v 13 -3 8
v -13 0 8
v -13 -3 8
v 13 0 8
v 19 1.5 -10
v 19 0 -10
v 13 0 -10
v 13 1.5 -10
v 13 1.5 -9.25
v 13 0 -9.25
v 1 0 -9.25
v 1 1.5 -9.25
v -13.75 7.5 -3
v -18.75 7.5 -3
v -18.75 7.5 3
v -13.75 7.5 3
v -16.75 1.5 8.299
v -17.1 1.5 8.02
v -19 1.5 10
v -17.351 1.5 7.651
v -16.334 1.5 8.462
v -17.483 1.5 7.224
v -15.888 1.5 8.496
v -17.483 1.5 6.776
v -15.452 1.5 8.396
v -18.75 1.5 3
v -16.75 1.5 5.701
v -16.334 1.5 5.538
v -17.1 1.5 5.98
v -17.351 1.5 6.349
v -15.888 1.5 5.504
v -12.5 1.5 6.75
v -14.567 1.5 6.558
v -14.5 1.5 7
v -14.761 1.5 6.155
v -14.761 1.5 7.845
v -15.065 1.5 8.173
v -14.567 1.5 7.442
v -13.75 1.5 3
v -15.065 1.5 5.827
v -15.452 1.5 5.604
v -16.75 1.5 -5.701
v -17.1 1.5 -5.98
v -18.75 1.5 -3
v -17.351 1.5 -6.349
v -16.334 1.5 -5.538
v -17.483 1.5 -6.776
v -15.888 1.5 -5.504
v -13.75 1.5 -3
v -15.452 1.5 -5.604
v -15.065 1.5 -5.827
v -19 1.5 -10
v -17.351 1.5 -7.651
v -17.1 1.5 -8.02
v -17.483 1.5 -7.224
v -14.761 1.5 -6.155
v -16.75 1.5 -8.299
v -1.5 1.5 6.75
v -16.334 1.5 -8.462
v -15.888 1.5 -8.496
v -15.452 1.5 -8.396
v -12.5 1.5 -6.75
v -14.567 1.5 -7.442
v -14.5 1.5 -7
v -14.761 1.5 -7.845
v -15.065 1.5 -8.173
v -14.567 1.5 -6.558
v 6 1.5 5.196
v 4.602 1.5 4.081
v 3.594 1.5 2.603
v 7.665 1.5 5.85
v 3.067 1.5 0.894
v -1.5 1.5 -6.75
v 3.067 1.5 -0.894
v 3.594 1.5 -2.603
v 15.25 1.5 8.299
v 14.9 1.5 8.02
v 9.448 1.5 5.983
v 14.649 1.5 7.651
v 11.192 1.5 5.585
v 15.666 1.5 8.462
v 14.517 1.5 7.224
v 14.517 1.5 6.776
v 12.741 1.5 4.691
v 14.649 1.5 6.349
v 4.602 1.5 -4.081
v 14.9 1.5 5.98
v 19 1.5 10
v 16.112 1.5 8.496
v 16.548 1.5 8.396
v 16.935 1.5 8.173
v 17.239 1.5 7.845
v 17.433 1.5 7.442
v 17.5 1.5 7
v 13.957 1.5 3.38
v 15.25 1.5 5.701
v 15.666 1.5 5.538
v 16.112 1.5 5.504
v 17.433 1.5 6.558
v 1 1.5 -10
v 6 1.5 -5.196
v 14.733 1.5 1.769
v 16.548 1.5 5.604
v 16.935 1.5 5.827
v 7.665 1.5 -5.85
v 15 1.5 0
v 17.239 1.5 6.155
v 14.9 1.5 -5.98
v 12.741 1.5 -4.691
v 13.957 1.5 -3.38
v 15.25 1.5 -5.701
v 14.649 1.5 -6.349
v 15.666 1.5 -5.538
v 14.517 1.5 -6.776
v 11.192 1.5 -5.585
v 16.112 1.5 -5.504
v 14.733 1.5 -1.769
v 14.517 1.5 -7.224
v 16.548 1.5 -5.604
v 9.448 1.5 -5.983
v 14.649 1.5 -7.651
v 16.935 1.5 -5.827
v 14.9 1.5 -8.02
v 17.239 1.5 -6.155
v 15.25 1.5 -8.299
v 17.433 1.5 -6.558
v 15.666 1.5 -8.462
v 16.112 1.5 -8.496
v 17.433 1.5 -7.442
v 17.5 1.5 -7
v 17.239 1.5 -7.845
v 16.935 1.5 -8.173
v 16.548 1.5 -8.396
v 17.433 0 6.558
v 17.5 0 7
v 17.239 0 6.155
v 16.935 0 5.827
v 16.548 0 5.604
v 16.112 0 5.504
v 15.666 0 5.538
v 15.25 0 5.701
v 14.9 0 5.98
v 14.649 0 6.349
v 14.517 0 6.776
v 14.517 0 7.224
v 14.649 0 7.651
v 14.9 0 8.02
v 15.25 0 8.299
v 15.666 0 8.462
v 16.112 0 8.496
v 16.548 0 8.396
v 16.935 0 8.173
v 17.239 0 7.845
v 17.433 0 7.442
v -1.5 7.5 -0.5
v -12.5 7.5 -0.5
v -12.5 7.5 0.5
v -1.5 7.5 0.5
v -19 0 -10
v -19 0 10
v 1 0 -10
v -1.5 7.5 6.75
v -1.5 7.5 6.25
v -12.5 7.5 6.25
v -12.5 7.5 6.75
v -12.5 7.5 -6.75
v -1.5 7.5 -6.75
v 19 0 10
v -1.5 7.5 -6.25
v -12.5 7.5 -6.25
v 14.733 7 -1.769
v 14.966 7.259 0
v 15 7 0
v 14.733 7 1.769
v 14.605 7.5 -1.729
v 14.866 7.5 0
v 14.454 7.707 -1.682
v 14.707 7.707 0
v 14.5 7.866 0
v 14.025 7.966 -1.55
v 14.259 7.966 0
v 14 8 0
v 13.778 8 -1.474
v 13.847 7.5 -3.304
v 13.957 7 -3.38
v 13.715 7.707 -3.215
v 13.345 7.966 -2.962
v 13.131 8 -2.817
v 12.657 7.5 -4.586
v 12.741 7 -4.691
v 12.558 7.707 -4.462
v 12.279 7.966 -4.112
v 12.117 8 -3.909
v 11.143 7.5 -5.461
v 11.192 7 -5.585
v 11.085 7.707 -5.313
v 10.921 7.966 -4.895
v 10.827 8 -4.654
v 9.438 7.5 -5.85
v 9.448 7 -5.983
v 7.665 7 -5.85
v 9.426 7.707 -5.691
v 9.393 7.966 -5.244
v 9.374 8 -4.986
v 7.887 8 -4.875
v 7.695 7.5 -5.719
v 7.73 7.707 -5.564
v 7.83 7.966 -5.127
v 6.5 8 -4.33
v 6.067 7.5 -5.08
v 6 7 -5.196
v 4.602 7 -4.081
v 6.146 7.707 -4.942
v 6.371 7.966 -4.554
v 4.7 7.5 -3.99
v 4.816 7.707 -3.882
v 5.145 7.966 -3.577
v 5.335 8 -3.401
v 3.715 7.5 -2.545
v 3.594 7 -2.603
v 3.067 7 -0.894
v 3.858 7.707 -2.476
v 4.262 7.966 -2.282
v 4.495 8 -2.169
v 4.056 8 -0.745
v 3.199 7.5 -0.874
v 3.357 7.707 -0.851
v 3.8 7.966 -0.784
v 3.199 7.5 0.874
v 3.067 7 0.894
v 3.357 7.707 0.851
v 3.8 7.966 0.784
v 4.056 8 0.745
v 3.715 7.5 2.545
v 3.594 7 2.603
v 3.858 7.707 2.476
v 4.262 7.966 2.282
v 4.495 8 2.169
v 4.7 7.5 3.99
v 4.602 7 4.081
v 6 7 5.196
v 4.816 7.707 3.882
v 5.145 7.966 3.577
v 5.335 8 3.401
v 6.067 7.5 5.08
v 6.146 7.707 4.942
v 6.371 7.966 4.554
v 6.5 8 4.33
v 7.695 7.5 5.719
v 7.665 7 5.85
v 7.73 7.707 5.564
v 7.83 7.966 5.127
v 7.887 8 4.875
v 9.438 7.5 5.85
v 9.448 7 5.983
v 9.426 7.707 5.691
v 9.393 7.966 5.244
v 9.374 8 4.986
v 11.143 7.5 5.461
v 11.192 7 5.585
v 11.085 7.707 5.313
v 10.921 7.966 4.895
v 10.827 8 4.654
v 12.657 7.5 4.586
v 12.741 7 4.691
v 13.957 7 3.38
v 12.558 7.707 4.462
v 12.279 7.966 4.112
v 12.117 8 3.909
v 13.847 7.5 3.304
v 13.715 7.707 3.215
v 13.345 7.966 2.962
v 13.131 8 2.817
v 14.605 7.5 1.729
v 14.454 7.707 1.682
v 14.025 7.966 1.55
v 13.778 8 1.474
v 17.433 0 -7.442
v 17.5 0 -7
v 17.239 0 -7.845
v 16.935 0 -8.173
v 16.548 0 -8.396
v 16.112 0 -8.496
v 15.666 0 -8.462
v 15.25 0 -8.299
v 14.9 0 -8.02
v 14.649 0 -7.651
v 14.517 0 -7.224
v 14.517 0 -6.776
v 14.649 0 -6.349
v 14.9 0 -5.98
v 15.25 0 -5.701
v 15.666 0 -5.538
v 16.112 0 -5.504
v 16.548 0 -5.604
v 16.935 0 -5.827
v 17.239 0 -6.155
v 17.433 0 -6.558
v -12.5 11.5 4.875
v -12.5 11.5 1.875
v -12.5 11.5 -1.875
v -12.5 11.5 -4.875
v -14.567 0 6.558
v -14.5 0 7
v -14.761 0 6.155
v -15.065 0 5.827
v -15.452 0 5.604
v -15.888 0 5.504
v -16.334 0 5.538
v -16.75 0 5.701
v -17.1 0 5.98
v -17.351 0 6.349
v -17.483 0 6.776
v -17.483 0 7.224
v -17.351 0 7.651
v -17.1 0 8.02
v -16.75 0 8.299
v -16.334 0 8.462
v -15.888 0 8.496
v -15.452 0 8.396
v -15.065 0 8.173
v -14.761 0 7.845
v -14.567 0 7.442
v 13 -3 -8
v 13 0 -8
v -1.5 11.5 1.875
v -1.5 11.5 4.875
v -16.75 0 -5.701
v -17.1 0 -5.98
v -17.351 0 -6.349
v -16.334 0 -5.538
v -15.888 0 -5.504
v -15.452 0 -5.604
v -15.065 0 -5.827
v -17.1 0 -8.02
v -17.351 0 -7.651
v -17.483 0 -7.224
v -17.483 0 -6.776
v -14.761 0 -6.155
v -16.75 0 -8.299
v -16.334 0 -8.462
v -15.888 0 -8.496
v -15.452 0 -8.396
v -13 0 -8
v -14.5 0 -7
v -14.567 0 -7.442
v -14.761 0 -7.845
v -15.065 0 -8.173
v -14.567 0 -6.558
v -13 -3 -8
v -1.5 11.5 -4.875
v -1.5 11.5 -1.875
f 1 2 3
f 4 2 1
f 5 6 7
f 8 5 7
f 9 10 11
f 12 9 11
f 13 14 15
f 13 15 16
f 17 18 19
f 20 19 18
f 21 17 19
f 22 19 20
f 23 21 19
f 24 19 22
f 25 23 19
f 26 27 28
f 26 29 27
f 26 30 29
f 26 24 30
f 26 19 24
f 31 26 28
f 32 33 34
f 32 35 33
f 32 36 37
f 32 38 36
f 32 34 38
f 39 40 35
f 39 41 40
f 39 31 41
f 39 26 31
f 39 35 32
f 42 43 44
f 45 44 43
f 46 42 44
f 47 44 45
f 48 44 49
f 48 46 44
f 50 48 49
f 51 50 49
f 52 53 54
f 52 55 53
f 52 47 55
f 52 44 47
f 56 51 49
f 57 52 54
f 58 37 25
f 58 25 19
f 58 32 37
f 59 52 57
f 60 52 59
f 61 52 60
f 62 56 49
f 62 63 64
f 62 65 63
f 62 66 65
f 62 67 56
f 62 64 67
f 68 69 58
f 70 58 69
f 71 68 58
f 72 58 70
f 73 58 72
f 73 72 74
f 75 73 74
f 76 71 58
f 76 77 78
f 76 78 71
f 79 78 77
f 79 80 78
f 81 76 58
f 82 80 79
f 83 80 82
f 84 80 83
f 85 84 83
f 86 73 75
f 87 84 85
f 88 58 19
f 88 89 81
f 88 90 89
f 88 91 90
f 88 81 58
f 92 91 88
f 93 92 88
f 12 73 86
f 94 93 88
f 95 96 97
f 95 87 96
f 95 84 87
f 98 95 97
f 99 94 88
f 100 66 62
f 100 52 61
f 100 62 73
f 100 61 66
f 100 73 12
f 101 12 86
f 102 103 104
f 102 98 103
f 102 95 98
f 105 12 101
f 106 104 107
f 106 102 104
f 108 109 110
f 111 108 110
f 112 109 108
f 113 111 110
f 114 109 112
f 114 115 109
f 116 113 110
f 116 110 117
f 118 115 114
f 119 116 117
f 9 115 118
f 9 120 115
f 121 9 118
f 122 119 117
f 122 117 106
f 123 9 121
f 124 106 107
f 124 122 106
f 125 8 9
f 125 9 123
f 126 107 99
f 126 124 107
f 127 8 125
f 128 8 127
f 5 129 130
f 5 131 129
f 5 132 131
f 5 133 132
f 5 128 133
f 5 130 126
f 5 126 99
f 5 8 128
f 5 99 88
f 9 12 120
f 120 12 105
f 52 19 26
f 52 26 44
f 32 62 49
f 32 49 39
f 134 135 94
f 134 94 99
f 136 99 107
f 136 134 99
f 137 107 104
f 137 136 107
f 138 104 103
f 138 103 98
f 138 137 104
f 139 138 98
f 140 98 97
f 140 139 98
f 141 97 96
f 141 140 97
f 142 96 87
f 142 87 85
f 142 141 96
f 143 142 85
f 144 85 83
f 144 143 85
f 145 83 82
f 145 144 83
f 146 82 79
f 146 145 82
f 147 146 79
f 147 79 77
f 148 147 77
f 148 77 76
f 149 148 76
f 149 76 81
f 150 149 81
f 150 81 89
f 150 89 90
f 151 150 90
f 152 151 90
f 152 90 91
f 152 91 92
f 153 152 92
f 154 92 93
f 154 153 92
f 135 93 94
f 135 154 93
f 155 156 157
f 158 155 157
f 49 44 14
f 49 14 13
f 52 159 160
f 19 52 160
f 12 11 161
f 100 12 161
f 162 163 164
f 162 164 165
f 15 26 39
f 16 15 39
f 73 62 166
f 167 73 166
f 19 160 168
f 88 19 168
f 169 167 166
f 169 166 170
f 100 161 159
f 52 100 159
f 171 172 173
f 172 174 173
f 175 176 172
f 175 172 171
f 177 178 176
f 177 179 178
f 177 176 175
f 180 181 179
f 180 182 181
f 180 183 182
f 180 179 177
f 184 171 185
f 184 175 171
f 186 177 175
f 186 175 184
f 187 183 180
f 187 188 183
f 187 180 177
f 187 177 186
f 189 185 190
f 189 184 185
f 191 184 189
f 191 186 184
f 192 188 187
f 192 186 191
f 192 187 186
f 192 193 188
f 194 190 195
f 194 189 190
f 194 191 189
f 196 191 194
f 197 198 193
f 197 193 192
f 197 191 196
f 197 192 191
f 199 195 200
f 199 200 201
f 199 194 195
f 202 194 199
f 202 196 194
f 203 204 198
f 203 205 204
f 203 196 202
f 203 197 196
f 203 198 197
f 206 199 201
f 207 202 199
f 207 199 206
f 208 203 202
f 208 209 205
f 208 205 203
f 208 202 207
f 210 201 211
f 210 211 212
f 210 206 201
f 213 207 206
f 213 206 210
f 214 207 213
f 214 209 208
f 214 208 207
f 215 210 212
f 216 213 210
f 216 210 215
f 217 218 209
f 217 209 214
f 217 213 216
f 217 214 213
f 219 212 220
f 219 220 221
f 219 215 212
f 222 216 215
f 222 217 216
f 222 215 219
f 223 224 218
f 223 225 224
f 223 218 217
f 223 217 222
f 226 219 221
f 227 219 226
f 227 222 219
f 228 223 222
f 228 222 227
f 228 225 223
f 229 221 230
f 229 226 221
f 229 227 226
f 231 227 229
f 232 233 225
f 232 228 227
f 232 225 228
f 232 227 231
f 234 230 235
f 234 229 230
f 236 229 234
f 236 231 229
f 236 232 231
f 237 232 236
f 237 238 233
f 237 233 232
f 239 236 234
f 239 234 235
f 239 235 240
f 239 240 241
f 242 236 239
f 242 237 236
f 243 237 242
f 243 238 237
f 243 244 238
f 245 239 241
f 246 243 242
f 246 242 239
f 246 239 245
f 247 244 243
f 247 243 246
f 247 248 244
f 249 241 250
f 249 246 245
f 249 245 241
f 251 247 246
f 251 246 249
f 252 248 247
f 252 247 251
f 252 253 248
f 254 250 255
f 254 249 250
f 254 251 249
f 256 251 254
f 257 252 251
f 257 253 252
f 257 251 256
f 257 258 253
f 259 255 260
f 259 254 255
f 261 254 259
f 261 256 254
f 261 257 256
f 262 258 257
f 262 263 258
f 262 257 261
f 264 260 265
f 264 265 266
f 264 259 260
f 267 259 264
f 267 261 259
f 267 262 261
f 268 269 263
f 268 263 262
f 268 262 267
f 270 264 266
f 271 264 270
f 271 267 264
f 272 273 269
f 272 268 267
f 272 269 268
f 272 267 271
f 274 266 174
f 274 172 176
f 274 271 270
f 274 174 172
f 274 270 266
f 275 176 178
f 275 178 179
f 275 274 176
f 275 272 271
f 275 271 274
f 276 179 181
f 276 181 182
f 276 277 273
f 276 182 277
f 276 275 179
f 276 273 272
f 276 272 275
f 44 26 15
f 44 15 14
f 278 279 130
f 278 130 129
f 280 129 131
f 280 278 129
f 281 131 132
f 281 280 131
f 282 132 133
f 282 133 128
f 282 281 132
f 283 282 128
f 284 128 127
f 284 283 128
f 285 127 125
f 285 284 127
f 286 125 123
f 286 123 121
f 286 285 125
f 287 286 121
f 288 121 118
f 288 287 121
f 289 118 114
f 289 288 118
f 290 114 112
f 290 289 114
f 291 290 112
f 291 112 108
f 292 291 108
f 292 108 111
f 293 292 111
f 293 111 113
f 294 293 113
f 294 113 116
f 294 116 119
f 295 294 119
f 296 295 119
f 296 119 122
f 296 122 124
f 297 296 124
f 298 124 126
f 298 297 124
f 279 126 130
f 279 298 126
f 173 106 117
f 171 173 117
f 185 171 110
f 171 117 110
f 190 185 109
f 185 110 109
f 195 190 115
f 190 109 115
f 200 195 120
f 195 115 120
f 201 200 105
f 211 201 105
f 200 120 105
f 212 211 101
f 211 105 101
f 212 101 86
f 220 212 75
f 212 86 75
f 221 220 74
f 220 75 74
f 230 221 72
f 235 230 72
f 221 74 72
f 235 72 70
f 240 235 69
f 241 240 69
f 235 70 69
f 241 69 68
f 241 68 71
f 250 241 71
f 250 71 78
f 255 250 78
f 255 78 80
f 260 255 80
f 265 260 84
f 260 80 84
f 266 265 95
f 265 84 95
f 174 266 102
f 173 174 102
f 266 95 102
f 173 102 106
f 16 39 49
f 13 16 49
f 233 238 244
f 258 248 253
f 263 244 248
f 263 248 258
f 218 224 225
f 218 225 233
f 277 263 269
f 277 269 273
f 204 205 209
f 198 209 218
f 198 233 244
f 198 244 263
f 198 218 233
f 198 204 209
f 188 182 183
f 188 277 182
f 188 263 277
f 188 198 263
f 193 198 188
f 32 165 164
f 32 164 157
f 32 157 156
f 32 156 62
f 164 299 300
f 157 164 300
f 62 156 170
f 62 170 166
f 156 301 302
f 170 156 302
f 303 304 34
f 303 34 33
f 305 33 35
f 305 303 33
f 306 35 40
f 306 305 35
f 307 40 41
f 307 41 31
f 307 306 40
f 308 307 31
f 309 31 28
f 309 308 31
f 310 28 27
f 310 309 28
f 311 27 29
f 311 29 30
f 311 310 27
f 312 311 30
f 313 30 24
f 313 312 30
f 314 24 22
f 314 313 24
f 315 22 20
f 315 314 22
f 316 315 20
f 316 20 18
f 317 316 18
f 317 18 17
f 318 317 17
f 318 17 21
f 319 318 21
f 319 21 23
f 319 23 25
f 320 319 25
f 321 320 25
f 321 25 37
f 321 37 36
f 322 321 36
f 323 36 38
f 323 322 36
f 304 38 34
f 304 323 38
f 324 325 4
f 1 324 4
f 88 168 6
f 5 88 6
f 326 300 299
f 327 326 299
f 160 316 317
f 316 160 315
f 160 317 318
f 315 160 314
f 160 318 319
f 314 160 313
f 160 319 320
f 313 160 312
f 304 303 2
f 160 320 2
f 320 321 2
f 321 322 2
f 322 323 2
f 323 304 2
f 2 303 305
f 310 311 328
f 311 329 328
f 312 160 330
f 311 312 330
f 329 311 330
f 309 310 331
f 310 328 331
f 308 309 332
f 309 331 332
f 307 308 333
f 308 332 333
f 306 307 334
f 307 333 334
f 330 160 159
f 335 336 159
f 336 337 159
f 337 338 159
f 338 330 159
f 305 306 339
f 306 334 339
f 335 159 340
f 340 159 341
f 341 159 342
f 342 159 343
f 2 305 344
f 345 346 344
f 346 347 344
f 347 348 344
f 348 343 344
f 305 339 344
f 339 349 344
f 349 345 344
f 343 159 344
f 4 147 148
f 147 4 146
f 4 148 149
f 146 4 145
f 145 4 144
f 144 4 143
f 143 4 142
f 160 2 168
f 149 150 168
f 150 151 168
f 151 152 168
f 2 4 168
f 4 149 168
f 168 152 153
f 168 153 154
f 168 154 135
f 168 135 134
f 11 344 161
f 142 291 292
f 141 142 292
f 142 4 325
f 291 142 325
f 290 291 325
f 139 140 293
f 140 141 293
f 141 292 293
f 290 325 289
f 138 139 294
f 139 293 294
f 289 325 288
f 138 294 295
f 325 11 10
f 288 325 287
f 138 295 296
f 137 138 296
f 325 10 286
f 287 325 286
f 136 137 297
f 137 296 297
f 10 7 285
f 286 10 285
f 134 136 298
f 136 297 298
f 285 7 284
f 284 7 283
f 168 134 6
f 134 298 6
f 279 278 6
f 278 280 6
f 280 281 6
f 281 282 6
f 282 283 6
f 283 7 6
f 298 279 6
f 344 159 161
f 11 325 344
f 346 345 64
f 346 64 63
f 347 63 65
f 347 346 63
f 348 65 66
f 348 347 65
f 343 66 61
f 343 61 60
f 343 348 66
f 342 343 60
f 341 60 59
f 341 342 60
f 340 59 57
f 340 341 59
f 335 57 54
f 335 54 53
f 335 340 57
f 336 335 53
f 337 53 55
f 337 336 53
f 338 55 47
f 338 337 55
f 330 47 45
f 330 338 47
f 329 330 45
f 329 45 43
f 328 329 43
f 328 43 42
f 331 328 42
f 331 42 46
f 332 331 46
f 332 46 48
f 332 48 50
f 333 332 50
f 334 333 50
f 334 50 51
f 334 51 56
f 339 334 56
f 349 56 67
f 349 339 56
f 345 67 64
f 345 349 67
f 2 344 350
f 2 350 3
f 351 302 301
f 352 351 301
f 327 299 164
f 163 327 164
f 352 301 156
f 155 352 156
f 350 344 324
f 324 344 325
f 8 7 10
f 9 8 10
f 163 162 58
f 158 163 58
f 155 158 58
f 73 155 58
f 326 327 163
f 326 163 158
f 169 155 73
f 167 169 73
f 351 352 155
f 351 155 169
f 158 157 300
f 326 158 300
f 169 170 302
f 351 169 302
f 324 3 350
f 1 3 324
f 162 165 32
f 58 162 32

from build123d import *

# Parameters (mm, degrees)
SKETCH1_R           = 1.5
BOSS_EXTRUDE1_DEPTH = 1.5
SKETCH2_R           = 6
BOSS_EXTRUDE2_DEPTH = 6.5
FILLET1_R           = 1
SKETCH3_W           = 5
SKETCH3_H           = 6
BOSS_EXTRUDE3_DEPTH = 6
BOSS_EXTRUDE4_START = -12.5
BOSS_EXTRUDE4_DEPTH = 11
SKETCH6_W           = 26
SKETCH6_H           = 16
BOSS_EXTRUDE5_DEPTH = 3


with BuildPart() as part:
    # Sketch1 → Boss-Extrude1 (new body)
    with BuildSketch(Plane(origin=(0, 0, 0), x_dir=(1, 0, 0), z_dir=(0, 1, 0))):
        Polygon((-19, -10), (19, -10), (19, 10), (13, 10), (13, 9.25), (1, 9.25), (1, 10), (-19, 10), align=None)
        with Locations((-16, 7)):
            Circle(SKETCH1_R, mode=Mode.SUBTRACT)
        with Locations((-16, -7)):
            Circle(SKETCH1_R, mode=Mode.SUBTRACT)
        with Locations((16, -7)):
            Circle(SKETCH1_R, mode=Mode.SUBTRACT)
        with Locations((16, 7)):
            Circle(SKETCH1_R, mode=Mode.SUBTRACT)
    extrude(amount=BOSS_EXTRUDE1_DEPTH)

    # Sketch2 → Boss-Extrude2 (add)
    with BuildSketch(Plane(origin=(0, 1.5, 0), x_dir=(1, 0, 0), z_dir=(0, 1, 0))):
        with Locations((9, 0)):
            Circle(SKETCH2_R)
    extrude(amount=BOSS_EXTRUDE2_DEPTH)

    # Fillet1
    fillet1_edges = [part.edges().sort_by_distance(p)[0] for p in [
        (3, 8, 0),
    ]]
    fillet(fillet1_edges, radius=FILLET1_R)

    # Sketch3 → Boss-Extrude3 (add)
    with BuildSketch(Plane(origin=(0, 1.5, 0), x_dir=(1, 0, 0), z_dir=(0, 1, 0))):
        with Locations((-16.25, 0)):
            Rectangle(SKETCH3_W, SKETCH3_H)
    extrude(amount=BOSS_EXTRUDE3_DEPTH)

    # Sketch5 → Boss-Extrude4 (add)
    with BuildSketch(Plane(origin=(0, 0, 0), x_dir=(0, 0, -1), z_dir=(1, 0, 0)).offset(BOSS_EXTRUDE4_START)):
        Polygon((6.75, 1.5), (6.75, 7.5), (6.25, 7.5), (4.875, 11.5), (1.875, 11.5), (0.5, 7.5), (-0.5, 7.5), (-1.875, 11.5), (-4.875, 11.5), (-6.25, 7.5), (-6.75, 7.5), (-6.75, 1.5), align=None)
    extrude(amount=BOSS_EXTRUDE4_DEPTH)

    # Sketch6 → Boss-Extrude5 (add)
    with BuildSketch(Plane.XZ):
        Rectangle(SKETCH6_W, SKETCH6_H)
    extrude(amount=BOSS_EXTRUDE5_DEPTH)


solid = part.part
